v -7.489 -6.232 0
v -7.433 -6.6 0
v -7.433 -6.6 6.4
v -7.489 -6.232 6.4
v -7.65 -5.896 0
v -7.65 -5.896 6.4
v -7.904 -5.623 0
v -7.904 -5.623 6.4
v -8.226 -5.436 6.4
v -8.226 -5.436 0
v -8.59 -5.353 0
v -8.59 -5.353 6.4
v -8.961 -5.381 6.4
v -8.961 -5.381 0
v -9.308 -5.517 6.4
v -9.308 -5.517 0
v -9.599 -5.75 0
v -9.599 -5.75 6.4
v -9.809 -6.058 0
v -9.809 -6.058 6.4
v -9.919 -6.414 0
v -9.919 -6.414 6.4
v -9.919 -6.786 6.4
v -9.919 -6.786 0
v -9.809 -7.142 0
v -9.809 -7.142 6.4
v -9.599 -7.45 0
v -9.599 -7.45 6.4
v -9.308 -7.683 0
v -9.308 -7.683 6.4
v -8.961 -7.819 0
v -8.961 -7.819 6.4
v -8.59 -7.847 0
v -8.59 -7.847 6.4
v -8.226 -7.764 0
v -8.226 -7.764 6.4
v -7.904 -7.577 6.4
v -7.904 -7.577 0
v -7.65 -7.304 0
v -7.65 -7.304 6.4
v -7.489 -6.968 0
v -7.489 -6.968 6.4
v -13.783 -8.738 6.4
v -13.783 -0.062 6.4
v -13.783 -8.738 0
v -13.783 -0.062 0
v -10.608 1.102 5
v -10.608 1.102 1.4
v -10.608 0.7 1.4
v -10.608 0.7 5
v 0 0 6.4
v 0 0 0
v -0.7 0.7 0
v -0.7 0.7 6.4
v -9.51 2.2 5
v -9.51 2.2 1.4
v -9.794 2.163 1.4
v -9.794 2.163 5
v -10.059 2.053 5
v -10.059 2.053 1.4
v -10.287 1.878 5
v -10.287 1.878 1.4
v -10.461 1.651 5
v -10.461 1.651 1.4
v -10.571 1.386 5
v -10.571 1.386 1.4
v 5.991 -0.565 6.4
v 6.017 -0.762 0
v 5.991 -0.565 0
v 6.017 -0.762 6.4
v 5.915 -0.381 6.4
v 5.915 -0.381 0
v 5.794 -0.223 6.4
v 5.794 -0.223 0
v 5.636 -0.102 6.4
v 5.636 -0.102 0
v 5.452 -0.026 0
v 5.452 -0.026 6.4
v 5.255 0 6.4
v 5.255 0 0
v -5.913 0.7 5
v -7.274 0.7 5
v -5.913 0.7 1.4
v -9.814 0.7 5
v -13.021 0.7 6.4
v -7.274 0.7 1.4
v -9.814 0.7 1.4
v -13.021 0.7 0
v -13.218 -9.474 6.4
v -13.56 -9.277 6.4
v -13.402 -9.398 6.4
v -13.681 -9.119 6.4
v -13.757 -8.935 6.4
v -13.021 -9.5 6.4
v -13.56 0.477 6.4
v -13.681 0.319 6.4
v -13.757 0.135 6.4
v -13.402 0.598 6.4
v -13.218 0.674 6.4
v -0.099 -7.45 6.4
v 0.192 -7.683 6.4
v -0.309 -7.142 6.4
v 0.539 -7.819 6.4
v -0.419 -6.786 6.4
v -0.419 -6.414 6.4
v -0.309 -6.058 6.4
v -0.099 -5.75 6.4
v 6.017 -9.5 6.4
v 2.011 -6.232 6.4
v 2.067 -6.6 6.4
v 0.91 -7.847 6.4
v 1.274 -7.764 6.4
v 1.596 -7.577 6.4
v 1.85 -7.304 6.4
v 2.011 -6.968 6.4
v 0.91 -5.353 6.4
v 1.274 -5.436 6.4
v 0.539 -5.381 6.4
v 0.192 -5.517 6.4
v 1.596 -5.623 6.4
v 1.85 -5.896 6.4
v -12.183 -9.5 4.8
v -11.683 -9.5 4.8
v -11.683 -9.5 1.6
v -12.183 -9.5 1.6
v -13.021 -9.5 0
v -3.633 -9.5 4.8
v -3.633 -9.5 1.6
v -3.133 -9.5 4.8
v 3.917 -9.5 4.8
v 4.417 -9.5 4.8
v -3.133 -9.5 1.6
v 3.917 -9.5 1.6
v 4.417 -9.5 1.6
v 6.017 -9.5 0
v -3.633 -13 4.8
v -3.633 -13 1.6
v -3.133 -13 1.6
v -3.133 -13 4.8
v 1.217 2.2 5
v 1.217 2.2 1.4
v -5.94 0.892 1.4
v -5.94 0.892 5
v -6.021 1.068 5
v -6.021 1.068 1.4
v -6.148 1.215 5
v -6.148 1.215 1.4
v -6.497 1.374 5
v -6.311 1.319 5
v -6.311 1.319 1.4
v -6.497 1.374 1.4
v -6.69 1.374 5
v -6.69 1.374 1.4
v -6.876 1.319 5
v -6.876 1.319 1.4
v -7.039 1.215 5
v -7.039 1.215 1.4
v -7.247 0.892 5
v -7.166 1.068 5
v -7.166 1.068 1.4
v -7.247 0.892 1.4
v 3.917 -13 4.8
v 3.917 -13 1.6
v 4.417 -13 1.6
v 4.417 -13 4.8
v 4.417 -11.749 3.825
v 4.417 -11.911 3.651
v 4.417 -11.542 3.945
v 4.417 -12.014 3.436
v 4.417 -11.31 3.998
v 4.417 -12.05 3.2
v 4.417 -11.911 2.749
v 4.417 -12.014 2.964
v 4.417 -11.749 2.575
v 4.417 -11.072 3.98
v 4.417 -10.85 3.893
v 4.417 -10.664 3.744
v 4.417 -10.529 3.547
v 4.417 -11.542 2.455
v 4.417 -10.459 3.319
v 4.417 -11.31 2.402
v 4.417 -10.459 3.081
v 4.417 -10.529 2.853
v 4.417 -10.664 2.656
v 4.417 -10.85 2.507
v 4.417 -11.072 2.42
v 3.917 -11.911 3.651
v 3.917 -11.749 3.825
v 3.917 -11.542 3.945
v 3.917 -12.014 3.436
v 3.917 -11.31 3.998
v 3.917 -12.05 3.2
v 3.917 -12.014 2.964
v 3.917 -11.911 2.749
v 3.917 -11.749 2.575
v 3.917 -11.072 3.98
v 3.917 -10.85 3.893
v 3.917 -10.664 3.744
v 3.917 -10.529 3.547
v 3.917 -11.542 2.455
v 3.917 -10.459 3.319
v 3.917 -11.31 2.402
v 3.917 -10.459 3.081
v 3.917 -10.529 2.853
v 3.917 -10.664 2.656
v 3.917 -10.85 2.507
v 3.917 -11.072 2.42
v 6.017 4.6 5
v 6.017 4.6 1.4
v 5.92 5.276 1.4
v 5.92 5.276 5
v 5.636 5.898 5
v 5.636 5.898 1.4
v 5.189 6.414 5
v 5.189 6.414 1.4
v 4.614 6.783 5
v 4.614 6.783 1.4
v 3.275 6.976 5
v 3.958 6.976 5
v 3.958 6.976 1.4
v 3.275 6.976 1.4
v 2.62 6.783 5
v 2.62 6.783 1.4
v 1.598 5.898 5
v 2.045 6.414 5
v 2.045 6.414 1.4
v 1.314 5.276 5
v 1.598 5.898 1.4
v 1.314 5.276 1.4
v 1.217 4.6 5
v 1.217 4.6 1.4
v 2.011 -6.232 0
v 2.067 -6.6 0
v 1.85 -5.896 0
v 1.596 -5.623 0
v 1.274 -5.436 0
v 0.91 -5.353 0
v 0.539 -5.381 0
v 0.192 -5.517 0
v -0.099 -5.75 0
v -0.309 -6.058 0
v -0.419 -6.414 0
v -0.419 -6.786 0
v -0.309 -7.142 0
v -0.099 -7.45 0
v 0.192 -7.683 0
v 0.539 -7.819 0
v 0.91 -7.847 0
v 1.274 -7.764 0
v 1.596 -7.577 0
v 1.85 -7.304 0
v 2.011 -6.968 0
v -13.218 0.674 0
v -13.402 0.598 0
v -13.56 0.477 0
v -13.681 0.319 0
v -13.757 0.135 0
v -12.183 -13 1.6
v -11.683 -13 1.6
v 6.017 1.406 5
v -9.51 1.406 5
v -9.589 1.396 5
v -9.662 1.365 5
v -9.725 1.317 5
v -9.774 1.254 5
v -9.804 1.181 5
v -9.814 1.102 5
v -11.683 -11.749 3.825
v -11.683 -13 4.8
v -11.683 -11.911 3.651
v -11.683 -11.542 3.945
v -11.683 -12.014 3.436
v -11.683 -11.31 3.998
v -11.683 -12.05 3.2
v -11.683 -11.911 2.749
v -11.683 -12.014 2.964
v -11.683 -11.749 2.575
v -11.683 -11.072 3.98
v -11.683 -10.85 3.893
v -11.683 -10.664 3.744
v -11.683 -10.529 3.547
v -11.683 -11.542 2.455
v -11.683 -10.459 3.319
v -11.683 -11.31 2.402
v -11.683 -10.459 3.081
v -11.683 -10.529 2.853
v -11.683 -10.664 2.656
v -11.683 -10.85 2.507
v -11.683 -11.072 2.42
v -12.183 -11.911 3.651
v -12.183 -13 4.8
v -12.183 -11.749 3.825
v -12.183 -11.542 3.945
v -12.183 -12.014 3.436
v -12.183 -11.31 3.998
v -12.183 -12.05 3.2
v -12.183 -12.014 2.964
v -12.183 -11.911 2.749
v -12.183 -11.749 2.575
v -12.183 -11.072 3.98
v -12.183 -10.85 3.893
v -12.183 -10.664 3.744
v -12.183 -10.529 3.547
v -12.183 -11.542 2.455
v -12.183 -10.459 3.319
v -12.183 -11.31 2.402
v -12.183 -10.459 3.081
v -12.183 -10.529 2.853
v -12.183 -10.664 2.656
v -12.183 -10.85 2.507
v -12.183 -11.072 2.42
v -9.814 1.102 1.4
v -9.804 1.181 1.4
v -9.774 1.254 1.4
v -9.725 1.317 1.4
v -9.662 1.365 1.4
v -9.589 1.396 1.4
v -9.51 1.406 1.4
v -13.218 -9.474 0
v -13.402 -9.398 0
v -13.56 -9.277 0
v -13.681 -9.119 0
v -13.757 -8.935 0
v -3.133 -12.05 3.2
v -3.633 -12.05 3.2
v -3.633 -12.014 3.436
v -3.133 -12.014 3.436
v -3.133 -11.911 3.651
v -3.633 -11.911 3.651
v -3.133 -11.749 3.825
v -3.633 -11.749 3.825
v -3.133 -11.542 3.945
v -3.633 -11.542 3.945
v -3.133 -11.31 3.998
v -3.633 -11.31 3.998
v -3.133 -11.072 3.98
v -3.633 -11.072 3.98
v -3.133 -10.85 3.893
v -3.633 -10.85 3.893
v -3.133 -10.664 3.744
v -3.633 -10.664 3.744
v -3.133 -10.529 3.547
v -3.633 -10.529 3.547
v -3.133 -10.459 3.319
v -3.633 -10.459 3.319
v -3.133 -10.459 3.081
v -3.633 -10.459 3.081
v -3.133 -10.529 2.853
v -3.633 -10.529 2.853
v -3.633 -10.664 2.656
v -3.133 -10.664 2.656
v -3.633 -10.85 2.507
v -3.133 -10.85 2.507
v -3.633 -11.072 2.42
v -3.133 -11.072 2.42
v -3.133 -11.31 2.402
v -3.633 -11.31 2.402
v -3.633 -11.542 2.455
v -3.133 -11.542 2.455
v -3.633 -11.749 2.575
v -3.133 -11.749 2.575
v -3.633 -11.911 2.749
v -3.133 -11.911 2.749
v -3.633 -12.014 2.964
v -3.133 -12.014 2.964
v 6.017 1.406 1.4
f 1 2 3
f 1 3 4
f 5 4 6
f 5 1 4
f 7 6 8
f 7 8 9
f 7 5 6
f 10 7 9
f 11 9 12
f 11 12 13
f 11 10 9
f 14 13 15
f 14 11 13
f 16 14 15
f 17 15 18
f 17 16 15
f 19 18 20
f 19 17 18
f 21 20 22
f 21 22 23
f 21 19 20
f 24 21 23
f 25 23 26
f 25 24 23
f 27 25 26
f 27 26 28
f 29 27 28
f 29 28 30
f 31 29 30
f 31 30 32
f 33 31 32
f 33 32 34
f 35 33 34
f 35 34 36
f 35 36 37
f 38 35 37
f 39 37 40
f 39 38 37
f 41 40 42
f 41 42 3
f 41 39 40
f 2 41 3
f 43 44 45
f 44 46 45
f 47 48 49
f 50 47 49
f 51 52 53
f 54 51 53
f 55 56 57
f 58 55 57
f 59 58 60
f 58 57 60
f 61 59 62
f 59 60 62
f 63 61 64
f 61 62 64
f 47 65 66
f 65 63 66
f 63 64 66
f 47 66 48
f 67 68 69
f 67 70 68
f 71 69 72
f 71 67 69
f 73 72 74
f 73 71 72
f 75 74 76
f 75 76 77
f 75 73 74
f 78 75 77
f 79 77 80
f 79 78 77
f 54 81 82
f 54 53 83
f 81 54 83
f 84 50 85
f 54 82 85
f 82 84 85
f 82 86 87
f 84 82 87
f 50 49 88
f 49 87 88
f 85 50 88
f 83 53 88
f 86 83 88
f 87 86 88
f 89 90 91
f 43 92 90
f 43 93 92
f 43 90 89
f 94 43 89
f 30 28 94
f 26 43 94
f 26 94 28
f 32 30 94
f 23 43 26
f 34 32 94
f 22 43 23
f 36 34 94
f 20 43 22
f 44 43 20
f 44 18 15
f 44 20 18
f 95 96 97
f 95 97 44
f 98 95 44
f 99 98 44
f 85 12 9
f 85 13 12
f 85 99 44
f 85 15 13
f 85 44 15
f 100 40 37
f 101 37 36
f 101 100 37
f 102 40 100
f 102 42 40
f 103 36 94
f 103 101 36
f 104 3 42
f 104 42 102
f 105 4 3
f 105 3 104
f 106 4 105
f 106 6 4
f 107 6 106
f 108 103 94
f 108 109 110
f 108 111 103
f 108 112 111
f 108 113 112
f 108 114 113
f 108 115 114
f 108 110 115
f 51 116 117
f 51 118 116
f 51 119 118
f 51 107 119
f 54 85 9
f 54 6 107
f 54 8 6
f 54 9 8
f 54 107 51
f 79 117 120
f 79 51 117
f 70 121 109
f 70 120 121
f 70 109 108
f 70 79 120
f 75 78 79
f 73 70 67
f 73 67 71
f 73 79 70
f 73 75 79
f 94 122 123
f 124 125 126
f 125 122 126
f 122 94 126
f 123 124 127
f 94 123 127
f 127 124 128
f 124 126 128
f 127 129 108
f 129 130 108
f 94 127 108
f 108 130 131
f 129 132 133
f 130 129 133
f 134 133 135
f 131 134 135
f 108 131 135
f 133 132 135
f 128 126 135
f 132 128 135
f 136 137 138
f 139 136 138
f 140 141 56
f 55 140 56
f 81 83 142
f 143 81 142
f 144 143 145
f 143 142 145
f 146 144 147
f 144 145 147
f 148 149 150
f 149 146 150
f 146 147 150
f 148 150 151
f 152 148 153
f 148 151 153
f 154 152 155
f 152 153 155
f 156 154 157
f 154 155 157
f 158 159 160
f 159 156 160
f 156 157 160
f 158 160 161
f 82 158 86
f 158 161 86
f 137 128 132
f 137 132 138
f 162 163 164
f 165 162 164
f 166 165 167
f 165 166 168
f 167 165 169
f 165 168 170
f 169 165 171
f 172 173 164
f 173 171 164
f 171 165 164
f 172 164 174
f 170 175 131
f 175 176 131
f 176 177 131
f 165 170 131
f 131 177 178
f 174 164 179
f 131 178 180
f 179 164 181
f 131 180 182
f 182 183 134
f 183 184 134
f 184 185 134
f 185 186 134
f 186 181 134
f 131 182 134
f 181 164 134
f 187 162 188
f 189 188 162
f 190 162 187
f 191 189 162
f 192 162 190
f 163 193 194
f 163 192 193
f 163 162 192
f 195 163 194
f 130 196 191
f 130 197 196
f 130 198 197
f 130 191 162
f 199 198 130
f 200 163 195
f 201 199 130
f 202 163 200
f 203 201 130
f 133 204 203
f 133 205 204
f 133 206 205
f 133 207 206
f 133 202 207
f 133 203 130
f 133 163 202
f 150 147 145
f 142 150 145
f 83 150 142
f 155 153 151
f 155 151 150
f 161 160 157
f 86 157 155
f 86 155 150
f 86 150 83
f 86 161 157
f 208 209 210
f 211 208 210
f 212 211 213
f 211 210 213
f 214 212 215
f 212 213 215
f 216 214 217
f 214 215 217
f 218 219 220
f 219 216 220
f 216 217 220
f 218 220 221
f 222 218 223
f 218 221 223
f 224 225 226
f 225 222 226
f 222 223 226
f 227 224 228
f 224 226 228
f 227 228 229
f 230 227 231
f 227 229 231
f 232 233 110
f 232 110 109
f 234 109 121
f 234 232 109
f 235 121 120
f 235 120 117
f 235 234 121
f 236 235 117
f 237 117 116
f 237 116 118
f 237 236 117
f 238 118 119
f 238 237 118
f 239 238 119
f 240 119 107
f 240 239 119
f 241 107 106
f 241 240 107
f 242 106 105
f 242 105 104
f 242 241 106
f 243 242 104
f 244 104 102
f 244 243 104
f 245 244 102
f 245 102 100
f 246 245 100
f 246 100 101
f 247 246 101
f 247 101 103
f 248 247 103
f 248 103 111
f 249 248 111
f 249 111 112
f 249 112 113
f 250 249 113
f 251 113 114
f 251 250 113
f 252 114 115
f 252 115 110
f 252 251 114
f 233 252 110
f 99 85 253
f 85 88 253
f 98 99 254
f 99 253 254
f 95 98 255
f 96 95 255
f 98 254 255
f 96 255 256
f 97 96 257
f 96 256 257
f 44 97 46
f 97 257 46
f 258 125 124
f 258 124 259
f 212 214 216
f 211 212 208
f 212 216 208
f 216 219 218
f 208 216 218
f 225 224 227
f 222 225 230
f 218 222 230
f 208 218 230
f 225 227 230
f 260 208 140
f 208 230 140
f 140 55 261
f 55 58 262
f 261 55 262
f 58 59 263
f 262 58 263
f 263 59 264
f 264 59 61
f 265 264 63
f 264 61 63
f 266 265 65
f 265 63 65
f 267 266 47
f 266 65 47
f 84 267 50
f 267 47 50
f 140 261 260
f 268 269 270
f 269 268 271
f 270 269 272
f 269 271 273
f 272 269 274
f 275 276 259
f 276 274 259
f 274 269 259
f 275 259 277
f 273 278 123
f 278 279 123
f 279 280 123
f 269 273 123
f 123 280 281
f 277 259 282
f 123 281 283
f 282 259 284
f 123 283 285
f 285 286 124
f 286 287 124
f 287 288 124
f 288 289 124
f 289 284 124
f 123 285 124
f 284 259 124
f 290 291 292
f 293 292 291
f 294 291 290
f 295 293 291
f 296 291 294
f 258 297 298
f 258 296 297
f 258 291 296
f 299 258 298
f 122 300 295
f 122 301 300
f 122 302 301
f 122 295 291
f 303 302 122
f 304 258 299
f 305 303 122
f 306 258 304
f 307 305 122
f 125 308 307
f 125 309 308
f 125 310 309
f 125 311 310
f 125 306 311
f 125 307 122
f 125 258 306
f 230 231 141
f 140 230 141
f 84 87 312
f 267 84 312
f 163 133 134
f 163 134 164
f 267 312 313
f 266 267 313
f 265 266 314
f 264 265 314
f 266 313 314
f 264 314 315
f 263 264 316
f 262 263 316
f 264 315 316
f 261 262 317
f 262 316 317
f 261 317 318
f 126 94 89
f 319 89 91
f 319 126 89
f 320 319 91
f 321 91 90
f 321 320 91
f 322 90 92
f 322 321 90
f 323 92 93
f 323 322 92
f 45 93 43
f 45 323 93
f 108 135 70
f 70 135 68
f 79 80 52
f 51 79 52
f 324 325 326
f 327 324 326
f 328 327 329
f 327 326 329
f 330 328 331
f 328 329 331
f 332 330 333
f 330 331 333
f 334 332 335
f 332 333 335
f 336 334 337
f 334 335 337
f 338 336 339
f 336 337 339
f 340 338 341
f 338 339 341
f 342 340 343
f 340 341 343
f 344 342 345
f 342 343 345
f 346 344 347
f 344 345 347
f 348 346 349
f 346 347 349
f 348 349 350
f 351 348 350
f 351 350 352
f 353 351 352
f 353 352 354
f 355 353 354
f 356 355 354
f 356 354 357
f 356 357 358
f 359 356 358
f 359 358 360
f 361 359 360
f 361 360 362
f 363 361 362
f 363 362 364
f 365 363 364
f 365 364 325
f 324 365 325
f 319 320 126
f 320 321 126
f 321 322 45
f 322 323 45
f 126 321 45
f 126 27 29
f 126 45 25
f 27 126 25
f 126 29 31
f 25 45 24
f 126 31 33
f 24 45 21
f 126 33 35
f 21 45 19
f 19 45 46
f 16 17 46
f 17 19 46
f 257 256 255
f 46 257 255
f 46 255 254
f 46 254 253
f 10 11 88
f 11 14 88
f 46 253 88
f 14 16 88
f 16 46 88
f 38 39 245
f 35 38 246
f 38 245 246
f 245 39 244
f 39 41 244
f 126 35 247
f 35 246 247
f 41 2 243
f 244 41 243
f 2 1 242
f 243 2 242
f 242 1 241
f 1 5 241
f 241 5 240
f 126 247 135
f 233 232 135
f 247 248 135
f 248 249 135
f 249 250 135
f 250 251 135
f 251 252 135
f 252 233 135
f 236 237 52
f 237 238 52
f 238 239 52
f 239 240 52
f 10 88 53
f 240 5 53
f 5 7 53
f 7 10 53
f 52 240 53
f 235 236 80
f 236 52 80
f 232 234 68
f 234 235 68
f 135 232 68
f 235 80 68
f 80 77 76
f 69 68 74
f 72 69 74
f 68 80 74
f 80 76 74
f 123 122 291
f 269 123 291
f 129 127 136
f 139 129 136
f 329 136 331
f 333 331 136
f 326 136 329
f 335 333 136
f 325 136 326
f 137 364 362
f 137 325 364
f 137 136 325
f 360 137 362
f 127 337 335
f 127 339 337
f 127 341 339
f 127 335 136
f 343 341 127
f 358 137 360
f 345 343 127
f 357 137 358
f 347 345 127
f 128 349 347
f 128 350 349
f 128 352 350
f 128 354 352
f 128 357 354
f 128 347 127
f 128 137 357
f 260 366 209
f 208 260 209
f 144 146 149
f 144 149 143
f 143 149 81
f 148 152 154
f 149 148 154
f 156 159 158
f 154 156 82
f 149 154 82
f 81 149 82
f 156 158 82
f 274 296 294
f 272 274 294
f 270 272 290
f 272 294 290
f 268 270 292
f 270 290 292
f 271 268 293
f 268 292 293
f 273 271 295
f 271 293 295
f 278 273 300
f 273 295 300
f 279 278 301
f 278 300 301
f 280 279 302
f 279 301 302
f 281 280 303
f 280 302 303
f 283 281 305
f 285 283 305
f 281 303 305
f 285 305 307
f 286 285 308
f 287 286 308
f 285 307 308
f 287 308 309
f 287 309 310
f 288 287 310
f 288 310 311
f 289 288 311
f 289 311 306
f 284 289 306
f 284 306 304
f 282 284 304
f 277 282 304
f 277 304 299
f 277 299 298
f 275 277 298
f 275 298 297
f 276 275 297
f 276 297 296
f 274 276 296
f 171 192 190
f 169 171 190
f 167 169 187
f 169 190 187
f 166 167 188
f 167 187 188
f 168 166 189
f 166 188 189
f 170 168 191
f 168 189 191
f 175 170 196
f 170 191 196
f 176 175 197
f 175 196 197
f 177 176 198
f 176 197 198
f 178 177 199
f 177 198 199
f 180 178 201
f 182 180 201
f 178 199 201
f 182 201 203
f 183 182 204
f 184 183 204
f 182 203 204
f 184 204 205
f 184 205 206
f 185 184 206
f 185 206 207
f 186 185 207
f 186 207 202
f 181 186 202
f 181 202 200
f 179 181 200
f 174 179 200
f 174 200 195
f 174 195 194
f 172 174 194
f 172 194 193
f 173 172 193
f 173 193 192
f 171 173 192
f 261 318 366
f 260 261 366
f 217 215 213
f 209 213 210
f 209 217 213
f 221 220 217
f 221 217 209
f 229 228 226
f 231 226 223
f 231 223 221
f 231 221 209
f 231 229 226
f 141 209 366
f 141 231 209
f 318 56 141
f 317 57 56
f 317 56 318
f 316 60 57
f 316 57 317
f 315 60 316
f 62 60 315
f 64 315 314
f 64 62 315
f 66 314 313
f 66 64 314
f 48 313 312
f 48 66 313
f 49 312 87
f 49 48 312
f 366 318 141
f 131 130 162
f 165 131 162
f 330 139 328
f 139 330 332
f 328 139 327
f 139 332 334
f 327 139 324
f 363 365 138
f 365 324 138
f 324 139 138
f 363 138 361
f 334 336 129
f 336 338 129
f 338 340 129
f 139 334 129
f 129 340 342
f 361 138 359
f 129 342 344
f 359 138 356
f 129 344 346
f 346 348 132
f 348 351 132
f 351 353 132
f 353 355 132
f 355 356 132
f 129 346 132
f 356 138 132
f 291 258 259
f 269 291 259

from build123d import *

# Parameters (mm, degrees)
F0_W     = 0.5
F0_H     = 3.5
F0_R     = 1.25
F1_DEPTH = 6.4
F2_W     = 25.4
F2_H     = 1.4
F2_W_2   = 3.5
F2_H_2   = 1.6
F2_R     = 0.8
F3_DEPTH = 19.8
F4_R     = 0.762


with BuildPart() as f1:
    # F0 (on Top) → F1 (new body)
    with BuildSketch(Plane.XY):
        with Locations((4.1668843009, -11.25)):
            Rectangle(F0_W, F0_H)
        with Locations((-3.3831156991, -11.25)):
            Rectangle(F0_W, F0_H)
        with Locations((-11.9331156991, -11.25)):
            Rectangle(F0_W, F0_H)
        with BuildLine():
            Line((-10.6081156991, 0.7), (-9.8143656991, 0.7))
            Line((-9.8143656991, 0.7), (-9.8143656991, 1.101979753))
            ThreePointArc((-9.8143656991, 1.101979753), (-9.7252470071, 1.317131308), (-9.5100954521, 1.40625))
            Line((-9.5100954521, 1.40625), (6.0168843009, 1.40625))
            Line((6.0168843009, 1.40625), (6.0168843009, 2.2))
            Line((6.0168843009, 2.2), (6.0168843009, 4.6))
            ThreePointArc((6.0168843009, 4.6), (3.6168843009, 7), (1.2168843009, 4.6))
            Line((1.2168843009, 4.6), (1.2168843009, 2.2))
            Line((1.2168843009, 2.2), (-9.5100954521, 2.2))
            ThreePointArc((-9.5100954521, 2.2), (-10.2865130147, 1.8783973155), (-10.6081156991, 1.101979753))
            Line((-10.6081156991, 1.101979753), (-10.6081156991, 0.7))
        make_face()
        with BuildLine():
            Line((6.0168843009, 0), (0, 0))
            Line((0, 0), (-0.7, 0.7))
            Line((-0.7, 0.7), (-5.9126656991, 0.7))
            ThreePointArc((-5.9126656991, 0.7), (-6.5935156991, 1.38085), (-7.2743656991, 0.7))
            Line((-7.2743656991, 0.7), (-9.8143656991, 0.7))
            Line((-9.8143656991, 0.7), (-10.6081156991, 0.7))
            Line((-10.6081156991, 0.7), (-13.7831156991, 0.7))
            Line((-13.7831156991, 0.7), (-13.7831156991, -9.5))
            Line((-13.7831156991, -9.5), (-12.1831156991, -9.5))
            Line((-12.1831156991, -9.5), (-11.6831156991, -9.5))
            Line((-11.6831156991, -9.5), (-3.6331156991, -9.5))
            Line((-3.6331156991, -9.5), (-3.1331156991, -9.5))
            Line((-3.1331156991, -9.5), (3.9168843009, -9.5))
            Line((3.9168843009, -9.5), (4.4168843009, -9.5))
            Line((4.4168843009, -9.5), (6.0168843009, -9.5))
            Line((6.0168843009, -9.5), (6.0168843009, 0))
        make_face()
        with Locations((-8.6831156991, -6.6)):
            Circle(F0_R, mode=Mode.SUBTRACT)
        with Locations((0.8168843009, -6.6)):
            Circle(F0_R, mode=Mode.SUBTRACT)
    extrude(amount=F1_DEPTH)

    # F2 (on face) → F3 (cut, through all)
    with BuildSketch(Plane(origin=(-13.7831156991, 0, 0), x_dir=(0, -1, 0), z_dir=(-1, 0, 0))):
        with Locations((-13.4, 0.7)):
            Rectangle(F2_W, F2_H)
        with Locations((-13.4, 5.7)):
            Rectangle(F2_W, F2_H)
        with Locations((11.25, 0.8)):
            Rectangle(F2_W_2, F2_H_2)
        with Locations((11.25, 5.6)):
            Rectangle(F2_W_2, F2_H_2)
        with Locations((11.25, 3.2)):
            Circle(F2_R)
    extrude(amount=-F3_DEPTH, mode=Mode.SUBTRACT)

    # F4
    f4_edges = [f1.edges().sort_by_distance(p)[0] for p in [
        (-13.783116, -9.5, 3.2),
        (6.016884, 0, 3.2),
        (-13.783116, 0.7, 3.2),
    ]]
    fillet(f4_edges, radius=F4_R)


solid = f1.part
